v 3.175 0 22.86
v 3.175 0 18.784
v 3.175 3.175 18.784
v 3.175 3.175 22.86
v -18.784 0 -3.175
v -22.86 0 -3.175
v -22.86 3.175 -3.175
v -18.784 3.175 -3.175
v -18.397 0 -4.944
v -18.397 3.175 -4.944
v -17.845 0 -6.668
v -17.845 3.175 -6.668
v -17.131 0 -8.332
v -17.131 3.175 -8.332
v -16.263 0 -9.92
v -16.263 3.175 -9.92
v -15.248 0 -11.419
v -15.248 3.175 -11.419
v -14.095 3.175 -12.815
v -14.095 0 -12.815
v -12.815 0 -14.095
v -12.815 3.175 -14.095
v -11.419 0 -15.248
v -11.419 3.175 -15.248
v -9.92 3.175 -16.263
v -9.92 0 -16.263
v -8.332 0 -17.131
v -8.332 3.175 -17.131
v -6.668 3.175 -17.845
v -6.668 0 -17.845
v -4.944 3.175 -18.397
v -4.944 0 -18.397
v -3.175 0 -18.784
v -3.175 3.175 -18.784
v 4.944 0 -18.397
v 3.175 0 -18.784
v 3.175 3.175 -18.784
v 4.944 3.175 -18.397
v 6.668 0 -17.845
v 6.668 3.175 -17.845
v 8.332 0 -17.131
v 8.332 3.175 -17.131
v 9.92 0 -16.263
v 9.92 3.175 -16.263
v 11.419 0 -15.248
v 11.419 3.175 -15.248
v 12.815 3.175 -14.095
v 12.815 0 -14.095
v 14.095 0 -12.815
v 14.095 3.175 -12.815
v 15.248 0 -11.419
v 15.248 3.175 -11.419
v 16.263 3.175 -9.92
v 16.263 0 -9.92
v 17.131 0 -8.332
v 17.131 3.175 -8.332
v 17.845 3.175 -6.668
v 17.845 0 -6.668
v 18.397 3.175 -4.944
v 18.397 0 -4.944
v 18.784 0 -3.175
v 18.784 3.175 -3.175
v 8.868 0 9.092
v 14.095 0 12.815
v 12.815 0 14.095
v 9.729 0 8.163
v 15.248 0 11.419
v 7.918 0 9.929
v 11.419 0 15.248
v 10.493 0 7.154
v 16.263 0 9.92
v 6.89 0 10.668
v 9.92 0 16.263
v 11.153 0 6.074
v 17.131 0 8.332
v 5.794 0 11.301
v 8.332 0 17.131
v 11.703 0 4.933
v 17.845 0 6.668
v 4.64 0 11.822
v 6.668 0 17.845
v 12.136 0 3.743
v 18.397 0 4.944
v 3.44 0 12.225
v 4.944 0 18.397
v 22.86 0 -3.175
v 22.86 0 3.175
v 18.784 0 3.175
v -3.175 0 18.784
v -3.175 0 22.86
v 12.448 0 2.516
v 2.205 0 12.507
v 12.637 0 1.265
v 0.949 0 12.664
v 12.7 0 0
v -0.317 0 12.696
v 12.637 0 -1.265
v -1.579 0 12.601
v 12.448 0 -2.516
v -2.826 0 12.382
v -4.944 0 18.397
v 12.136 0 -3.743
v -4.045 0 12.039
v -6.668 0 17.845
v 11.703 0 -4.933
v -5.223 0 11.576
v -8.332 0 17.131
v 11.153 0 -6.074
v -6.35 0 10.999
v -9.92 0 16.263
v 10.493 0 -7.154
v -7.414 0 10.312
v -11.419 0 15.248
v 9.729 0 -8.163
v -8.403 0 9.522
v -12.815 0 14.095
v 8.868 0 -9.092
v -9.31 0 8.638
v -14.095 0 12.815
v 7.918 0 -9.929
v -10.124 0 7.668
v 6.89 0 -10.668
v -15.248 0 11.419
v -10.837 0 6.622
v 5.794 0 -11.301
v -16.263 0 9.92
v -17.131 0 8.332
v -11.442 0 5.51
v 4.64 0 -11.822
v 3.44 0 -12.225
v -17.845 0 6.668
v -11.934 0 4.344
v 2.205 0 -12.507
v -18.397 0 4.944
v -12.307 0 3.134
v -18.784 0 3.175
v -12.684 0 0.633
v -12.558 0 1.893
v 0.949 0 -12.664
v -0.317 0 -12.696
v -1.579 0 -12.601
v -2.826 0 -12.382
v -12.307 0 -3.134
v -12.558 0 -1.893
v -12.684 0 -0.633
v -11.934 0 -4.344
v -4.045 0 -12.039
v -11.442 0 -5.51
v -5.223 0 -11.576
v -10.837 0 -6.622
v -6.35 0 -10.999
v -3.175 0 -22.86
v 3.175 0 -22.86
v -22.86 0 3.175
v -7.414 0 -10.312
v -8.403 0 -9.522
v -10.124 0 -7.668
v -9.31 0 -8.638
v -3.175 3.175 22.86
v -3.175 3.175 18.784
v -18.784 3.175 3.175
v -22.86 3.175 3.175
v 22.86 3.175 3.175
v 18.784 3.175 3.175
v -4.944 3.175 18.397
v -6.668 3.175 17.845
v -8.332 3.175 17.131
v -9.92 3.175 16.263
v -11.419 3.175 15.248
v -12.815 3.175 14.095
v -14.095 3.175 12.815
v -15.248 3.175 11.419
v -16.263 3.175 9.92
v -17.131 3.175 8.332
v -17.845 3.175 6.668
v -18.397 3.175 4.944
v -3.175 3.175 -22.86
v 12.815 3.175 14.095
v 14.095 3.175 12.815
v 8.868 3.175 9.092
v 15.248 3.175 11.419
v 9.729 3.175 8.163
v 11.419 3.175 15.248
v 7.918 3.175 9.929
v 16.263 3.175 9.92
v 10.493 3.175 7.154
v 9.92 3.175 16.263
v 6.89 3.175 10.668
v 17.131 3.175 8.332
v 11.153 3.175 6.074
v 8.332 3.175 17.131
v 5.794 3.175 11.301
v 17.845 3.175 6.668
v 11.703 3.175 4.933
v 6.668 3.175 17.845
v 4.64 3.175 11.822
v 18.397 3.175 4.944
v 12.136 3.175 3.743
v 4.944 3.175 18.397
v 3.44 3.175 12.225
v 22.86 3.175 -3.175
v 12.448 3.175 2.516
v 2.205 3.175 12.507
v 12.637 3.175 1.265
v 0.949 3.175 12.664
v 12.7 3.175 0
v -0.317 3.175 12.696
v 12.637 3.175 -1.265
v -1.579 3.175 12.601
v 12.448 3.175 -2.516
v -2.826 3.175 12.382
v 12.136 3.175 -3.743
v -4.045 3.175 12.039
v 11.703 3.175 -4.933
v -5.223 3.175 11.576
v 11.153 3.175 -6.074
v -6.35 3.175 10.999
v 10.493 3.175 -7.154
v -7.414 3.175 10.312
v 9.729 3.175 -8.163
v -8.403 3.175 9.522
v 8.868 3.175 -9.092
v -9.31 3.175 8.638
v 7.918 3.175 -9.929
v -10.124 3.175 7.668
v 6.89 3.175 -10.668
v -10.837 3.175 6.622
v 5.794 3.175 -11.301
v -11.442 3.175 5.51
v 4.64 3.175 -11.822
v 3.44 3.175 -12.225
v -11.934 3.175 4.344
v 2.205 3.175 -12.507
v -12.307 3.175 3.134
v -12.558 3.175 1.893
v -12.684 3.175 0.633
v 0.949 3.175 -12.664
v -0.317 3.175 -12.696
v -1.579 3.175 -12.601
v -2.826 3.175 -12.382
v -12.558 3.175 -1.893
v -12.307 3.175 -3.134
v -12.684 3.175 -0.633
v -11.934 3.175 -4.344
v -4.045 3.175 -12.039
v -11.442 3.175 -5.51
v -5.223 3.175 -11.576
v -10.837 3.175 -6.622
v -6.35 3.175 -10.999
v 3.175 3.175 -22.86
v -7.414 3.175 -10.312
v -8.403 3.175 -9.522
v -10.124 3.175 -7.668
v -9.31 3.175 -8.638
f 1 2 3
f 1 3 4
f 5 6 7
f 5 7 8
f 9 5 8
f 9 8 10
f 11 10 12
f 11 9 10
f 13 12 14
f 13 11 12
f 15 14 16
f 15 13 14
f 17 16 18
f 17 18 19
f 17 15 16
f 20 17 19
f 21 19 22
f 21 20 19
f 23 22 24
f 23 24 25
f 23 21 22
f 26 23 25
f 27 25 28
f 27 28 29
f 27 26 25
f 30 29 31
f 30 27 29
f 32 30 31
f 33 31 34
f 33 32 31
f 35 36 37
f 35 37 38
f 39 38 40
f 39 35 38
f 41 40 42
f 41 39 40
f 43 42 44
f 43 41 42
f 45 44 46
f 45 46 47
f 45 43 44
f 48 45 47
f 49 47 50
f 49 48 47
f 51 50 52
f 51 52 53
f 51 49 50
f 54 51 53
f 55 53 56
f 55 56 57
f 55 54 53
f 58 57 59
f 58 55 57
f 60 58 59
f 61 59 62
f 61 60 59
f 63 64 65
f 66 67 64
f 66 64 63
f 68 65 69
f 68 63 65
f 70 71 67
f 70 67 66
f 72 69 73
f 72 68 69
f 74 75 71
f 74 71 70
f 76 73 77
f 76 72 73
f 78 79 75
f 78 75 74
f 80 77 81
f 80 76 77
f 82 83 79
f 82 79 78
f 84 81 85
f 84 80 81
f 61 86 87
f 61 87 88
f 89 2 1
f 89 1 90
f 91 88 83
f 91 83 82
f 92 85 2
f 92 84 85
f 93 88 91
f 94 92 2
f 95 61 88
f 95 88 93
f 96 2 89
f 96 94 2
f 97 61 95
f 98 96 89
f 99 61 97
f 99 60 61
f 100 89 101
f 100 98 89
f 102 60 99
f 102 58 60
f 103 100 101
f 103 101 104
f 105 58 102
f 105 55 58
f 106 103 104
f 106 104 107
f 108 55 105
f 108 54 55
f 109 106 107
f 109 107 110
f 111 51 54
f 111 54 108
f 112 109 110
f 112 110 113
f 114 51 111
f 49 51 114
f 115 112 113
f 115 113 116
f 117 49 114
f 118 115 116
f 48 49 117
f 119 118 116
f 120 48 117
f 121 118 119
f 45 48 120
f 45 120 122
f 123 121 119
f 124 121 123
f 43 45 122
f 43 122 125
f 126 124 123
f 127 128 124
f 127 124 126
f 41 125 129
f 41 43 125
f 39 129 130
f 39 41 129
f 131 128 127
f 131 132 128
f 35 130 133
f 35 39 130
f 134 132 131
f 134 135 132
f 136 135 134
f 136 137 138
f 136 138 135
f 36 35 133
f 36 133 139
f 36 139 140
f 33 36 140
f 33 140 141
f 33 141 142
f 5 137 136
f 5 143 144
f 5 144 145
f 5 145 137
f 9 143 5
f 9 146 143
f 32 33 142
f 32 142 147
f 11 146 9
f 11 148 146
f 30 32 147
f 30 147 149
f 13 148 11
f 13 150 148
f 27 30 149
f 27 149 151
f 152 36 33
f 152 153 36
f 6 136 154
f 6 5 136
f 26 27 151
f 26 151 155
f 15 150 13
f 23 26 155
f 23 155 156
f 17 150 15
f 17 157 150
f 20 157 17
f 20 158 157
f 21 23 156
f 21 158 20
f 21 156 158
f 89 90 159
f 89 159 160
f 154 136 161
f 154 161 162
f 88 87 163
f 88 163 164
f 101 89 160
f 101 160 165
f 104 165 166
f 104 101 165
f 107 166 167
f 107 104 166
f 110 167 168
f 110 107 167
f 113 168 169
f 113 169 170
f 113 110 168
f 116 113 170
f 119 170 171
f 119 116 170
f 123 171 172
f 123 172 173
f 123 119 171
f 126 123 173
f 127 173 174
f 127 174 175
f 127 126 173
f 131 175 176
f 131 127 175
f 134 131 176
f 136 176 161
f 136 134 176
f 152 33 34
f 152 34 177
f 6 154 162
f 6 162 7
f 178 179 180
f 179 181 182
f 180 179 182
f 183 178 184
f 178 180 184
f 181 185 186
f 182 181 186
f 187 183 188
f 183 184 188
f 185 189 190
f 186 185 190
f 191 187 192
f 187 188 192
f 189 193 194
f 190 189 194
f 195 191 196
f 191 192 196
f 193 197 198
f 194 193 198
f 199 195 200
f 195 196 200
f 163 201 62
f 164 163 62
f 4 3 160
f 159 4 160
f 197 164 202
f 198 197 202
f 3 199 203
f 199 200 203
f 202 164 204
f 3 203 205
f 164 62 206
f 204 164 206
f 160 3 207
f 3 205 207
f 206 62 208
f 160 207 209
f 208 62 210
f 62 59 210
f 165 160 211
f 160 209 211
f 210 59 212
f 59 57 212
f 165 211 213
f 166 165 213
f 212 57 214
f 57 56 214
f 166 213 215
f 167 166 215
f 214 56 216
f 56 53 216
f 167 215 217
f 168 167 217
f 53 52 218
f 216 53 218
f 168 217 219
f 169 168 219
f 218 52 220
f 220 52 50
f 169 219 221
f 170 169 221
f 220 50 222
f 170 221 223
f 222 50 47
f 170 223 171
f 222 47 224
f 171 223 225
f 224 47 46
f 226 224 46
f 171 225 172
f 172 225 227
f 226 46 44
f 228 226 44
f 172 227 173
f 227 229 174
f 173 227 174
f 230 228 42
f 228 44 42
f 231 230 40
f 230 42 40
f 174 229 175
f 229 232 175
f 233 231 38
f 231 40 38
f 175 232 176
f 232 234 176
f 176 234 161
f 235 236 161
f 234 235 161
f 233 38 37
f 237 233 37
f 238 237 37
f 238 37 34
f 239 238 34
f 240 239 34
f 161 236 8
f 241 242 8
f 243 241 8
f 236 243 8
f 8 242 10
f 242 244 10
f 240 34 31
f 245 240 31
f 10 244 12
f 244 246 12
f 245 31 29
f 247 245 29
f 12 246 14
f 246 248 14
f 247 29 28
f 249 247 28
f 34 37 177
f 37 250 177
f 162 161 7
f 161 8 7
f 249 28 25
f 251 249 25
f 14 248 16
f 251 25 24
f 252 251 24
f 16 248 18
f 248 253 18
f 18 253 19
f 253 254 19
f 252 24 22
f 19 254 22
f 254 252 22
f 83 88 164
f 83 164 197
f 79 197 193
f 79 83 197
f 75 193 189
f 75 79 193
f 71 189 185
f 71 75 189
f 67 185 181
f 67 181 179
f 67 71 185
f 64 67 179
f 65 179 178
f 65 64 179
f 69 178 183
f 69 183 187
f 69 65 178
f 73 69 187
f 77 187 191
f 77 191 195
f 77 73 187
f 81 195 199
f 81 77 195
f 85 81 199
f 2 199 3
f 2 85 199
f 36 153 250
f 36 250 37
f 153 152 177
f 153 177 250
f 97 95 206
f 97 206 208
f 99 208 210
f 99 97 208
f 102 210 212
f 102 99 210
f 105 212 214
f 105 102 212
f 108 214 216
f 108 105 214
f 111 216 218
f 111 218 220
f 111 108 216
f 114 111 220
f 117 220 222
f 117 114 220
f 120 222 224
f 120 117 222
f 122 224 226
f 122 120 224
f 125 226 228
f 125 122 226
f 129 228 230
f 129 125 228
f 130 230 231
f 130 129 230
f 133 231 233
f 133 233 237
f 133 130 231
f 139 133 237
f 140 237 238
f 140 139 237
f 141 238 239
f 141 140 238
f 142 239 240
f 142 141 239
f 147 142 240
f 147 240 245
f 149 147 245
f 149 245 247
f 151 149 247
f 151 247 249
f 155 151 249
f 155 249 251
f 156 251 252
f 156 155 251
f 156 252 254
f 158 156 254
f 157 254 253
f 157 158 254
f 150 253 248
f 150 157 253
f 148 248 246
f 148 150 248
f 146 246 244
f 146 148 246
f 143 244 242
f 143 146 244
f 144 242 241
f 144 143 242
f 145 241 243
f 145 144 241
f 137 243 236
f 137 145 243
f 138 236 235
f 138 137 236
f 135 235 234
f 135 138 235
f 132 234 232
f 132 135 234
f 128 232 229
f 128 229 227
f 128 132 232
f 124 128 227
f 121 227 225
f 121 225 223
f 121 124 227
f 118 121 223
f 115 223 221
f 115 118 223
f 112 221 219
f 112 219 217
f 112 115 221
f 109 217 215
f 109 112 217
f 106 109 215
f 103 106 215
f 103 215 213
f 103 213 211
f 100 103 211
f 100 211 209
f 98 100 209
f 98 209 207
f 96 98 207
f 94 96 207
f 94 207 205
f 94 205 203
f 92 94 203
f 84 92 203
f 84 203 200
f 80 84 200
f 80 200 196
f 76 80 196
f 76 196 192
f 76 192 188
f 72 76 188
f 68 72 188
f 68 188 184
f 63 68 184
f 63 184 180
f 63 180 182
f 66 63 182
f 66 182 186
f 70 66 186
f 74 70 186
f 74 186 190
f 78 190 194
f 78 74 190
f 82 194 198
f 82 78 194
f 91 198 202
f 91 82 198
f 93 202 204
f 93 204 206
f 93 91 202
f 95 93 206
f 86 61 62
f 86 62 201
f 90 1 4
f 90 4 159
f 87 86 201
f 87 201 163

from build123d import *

# Parameters (mm, degrees)
SKETCH1_R           = 12.7
BOSS_EXTRUDE1_DEPTH = 3.175


with BuildPart() as part:
    # Sketch1 → Boss-Extrude1 (new body)
    with BuildSketch(Plane(origin=(0, 0, 0), x_dir=(1, 0, 0), z_dir=(0, 1, 0))):
        with BuildLine():
            Line((-18.783553311, -3.175), (-22.86, -3.175))
            Line((-22.86, -3.175), (-22.86, 3.175))
            Line((-22.86, 3.175), (-18.783553311, 3.175))
            ThreePointArc((-18.783553311, 3.175), (-13.470384182, 13.470384182), (-3.175, 18.783553311))
            Line((-3.175, 18.783553311), (-3.175, 22.86))
            Line((-3.175, 22.86), (3.175, 22.86))
            Line((3.175, 22.86), (3.175, 18.783553311))
            ThreePointArc((3.175, 18.783553311), (13.470384182, 13.470384182), (18.783553311, 3.175))
            Line((18.783553311, 3.175), (22.86, 3.175))
            Line((22.86, 3.175), (22.86, -3.175))
            Line((22.86, -3.175), (18.783553311, -3.175))
            ThreePointArc((18.783553311, -3.175), (13.470384182, -13.470384182), (3.175, -18.783553311))
            Line((3.175, -18.783553311), (3.175, -22.86))
            Line((3.175, -22.86), (-3.175, -22.86))
            Line((-3.175, -22.86), (-3.175, -18.783553311))
            ThreePointArc((-3.175, -18.783553311), (-13.470384182, -13.470384182), (-18.783553311, -3.175))
        make_face()
        Circle(SKETCH1_R, mode=Mode.SUBTRACT)
    extrude(amount=BOSS_EXTRUDE1_DEPTH)


solid = part.part
